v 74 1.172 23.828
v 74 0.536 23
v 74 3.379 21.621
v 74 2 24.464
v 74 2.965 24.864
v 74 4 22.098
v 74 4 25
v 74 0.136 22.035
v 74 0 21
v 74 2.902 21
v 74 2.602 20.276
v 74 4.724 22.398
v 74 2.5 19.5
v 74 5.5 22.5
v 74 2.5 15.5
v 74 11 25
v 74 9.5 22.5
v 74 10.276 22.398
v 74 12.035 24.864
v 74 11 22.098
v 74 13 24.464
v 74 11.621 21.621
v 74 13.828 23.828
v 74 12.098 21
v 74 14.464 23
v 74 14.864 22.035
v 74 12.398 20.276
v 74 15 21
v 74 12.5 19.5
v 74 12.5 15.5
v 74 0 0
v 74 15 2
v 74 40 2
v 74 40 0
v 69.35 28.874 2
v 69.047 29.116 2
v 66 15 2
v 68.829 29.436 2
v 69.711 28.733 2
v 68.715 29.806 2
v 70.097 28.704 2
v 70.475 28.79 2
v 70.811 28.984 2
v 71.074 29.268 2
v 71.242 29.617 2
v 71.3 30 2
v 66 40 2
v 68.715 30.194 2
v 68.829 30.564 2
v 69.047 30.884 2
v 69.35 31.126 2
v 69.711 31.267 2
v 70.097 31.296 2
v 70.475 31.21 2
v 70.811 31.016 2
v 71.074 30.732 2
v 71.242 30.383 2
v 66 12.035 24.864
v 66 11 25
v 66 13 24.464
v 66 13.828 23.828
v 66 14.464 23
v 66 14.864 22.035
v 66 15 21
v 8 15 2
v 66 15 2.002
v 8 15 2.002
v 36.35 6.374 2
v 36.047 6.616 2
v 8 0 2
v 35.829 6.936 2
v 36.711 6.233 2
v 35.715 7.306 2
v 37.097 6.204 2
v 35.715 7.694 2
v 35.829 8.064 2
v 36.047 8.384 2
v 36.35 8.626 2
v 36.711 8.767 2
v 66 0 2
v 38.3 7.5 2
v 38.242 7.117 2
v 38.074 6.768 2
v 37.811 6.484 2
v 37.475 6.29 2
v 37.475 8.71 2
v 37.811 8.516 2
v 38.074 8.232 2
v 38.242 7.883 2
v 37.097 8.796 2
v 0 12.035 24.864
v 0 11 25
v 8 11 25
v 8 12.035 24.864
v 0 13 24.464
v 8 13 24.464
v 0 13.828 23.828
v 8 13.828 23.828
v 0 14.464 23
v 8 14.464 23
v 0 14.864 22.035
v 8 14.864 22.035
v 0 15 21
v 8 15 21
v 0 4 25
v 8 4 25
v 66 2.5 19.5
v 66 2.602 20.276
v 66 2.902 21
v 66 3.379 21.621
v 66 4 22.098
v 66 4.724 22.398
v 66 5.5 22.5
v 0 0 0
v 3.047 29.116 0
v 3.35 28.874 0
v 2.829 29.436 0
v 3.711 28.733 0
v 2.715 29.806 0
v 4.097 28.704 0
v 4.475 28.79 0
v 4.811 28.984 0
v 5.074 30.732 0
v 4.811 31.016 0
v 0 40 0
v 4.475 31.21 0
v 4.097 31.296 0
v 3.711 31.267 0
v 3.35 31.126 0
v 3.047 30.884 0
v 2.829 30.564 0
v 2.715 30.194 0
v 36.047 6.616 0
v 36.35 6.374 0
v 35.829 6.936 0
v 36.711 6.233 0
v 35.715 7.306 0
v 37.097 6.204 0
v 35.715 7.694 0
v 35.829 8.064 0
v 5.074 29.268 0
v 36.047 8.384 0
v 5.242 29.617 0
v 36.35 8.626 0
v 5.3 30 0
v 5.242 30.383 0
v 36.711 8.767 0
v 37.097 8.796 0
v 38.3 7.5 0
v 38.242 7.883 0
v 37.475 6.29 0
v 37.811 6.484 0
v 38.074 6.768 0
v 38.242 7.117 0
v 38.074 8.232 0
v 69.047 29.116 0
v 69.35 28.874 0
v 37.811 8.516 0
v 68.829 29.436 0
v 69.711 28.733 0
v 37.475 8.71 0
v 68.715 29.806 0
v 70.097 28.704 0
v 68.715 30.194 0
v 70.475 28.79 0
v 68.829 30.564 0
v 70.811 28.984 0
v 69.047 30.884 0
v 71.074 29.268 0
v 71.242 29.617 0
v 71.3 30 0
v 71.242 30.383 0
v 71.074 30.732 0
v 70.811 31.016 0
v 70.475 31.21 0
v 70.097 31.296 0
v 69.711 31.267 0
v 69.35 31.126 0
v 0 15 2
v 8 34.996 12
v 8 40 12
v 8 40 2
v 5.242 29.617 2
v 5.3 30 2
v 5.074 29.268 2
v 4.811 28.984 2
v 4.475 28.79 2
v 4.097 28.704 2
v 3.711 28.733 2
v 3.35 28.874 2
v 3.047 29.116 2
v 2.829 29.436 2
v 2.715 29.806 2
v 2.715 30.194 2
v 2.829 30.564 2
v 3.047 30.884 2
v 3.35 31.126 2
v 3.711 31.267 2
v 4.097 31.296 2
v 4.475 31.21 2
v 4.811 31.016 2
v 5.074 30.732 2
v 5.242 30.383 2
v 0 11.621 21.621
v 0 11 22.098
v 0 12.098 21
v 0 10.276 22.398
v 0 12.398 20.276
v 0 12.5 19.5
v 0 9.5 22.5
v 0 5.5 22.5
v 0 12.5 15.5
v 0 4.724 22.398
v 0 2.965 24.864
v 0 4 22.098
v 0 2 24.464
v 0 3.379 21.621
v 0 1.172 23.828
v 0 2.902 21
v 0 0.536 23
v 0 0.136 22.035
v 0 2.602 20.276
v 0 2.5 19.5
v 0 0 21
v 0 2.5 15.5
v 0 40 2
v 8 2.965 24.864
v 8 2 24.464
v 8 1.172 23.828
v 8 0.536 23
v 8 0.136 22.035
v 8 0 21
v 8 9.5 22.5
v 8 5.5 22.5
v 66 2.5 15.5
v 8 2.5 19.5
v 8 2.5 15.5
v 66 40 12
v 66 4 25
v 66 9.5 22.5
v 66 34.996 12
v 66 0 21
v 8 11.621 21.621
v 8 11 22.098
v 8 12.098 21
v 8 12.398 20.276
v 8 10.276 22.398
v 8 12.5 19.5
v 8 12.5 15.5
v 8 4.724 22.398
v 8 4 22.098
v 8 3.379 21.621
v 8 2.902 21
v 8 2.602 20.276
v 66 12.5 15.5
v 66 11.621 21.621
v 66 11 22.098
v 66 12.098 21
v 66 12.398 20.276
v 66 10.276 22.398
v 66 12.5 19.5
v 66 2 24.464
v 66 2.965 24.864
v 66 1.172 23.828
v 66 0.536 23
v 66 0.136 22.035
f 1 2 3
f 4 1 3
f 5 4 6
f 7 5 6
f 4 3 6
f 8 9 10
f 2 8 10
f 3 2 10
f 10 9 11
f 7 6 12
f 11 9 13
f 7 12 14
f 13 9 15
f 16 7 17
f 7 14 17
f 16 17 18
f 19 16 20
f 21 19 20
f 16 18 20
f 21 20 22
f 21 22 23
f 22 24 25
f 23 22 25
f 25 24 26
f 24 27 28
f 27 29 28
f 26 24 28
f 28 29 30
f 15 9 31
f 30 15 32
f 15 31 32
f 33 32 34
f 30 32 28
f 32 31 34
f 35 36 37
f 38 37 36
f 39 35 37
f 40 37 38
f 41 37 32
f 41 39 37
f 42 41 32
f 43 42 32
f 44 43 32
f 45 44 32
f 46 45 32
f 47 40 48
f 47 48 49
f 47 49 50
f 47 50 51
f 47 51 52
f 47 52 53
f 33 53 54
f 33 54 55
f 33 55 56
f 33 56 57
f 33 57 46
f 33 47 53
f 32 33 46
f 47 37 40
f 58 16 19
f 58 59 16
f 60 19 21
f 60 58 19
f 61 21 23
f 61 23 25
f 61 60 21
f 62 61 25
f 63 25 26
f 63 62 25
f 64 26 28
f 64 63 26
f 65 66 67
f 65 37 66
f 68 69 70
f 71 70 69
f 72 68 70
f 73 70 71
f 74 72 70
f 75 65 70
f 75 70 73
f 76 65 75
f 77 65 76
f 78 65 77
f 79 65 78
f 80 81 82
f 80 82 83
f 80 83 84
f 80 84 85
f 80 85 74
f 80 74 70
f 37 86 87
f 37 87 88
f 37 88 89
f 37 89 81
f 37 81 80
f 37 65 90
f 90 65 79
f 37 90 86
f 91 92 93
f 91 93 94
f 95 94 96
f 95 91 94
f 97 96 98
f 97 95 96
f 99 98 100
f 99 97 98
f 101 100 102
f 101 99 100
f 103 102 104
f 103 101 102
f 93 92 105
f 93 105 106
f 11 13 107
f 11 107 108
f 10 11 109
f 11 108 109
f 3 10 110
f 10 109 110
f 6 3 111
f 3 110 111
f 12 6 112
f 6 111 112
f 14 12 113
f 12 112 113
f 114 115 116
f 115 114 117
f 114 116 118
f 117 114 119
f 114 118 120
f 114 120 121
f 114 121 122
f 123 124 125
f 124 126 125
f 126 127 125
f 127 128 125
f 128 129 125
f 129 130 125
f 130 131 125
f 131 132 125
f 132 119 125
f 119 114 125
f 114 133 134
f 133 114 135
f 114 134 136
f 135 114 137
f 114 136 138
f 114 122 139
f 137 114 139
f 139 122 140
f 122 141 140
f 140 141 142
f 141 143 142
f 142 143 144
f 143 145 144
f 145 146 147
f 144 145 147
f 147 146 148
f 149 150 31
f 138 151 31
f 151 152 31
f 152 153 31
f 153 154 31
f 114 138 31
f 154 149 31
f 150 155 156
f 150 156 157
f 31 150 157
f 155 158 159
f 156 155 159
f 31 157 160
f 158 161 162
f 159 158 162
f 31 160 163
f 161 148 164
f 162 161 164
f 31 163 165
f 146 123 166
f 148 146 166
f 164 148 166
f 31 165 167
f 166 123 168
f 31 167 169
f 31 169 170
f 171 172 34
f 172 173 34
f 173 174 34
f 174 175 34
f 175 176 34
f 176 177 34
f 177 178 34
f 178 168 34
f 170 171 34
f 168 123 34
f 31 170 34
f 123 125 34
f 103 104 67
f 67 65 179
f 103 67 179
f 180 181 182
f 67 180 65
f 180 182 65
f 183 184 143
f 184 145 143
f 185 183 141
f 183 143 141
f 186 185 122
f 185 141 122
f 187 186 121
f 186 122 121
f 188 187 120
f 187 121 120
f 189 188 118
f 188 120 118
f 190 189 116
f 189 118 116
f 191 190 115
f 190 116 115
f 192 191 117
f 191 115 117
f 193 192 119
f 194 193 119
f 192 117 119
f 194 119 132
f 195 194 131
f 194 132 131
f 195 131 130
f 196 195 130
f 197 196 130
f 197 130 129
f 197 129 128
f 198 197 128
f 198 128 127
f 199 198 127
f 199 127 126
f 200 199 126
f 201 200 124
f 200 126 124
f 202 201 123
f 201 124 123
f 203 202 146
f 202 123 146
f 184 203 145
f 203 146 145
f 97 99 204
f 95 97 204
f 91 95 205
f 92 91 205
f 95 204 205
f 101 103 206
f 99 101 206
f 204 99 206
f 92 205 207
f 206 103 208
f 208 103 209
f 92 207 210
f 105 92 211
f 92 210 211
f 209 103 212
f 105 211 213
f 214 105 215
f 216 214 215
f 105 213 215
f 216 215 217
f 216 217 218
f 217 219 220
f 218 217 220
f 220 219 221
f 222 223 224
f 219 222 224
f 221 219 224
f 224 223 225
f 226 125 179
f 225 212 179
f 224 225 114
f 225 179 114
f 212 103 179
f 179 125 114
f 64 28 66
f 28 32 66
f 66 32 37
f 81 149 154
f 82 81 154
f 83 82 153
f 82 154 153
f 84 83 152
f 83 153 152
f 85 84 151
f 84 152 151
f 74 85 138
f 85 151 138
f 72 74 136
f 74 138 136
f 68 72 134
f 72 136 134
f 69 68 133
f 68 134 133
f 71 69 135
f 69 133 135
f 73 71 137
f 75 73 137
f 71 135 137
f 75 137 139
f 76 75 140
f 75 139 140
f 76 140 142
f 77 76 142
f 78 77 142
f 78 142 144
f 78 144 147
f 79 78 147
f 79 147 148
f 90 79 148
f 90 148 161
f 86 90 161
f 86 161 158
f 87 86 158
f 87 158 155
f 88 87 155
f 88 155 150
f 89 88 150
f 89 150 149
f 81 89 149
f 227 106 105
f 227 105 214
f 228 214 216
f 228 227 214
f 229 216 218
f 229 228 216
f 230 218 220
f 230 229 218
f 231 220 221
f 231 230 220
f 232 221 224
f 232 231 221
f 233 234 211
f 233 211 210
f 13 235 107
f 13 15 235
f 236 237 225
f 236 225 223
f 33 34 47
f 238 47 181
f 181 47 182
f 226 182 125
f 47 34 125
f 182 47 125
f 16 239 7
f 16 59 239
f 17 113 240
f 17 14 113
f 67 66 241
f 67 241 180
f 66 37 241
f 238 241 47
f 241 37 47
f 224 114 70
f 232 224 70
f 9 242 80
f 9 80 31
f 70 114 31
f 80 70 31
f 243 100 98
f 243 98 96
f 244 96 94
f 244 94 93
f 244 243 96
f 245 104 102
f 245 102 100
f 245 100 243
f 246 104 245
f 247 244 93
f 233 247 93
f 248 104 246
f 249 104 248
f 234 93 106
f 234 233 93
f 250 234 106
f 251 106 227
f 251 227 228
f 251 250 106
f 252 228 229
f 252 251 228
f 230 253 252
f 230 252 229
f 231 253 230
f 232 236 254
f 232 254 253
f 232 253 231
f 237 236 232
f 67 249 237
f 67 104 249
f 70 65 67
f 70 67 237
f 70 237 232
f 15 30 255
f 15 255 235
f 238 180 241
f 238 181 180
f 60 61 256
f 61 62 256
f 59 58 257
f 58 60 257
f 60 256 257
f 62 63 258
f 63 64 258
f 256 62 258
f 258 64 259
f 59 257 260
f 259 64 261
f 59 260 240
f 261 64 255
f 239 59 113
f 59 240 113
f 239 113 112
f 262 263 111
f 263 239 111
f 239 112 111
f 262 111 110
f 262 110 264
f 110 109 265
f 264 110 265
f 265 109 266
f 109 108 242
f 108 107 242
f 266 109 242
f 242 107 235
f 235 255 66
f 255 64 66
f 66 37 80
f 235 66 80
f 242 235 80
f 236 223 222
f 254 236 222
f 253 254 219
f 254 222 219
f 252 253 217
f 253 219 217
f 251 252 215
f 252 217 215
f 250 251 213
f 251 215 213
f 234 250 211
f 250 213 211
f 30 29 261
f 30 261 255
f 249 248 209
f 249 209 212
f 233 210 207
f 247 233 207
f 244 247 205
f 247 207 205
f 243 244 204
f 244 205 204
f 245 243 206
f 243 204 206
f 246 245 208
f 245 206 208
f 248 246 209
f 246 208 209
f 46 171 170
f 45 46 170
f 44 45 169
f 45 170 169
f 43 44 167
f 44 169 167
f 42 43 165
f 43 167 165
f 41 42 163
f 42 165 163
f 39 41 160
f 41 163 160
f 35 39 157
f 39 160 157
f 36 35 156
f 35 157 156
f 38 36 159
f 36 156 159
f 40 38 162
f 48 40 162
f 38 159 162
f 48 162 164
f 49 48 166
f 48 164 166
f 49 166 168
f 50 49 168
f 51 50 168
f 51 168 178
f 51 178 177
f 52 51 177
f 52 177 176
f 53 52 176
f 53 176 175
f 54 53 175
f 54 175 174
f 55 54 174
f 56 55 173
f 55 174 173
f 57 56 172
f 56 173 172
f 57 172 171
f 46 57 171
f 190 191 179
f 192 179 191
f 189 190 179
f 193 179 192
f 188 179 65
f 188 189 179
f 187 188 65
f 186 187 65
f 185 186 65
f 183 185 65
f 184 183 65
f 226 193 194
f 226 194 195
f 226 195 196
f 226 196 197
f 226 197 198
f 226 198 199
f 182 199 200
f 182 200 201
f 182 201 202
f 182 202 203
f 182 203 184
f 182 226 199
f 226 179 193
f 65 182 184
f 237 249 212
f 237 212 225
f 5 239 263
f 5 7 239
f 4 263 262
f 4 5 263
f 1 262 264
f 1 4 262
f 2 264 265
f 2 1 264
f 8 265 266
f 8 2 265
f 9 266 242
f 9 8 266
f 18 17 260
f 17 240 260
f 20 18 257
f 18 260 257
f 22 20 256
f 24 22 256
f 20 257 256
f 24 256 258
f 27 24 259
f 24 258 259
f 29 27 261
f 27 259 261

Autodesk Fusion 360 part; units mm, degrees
sketch "Sketch1" plane through (0, 0, 0) normal (0, 0, 1) x (1, 0, 0)
  line L0 (0, 0) -> (74, 0)
  line L1 (74, 0) -> (74, 40)
  line L2 (74, 40) -> (0, 40)
  line L3 (0, 40) -> (0, 0)
  line L4 (0, 0) -> (74, 0)
  line L5 (74, 0) -> (74, 15)
  line L6 (74, 15) -> (0, 15)
  line L7 (0, 15) -> (0, 0)
  line L8 (0, 15) -> (8, 15)
  line L9 (8, 15) -> (8, 0)
  line L10 (8, 0) -> (0, 0)
  line L11 (0, 0) -> (0, 15)
  line L12 (74, 15) -> (66, 15)
  line L13 (66, 15) -> (66, 0)
  line L14 (66, 0) -> (74, 0)
  line L15 (74, 0) -> (74, 15)
  line L16 (8, 15) -> (66, 15)
  line L17 (66, 15) -> (66, 40)
  line L18 (66, 40) -> (8, 40)
  line L19 (8, 40) -> (8, 15)
  circle A0 centre (4, 30) radius 1.3
  circle A1 centre (70, 30) radius 1.3
  circle A2 centre (37, 7.5) radius 1.3
  dimension "d1" = 74
  dimension "d2" = 40
  dimension "d3" = 15
  dimension "d6" = 8
  dimension "d7" = 8
  dimension "d16" = 2.6
  dimension "d17" = 4
  dimension "d18" = 2.6
  dimension "d19" = 4
  dimension "d20" = 10
  dimension "d21" = 10
  dimension "d22" = 2.6
  dimension "d23" = 7.5
  dimension "d24" = 37
  dimension "d35" = 8
extrude "Extrude1" add sketch "Sketch1" along normal blind 2 contours L0 L3 L4 L6 L7 L8 L9 L10 L11 | L0 L4 L6 L9 L13 L16 | L2 L3 L6 L8 L19 | L0 L1 L4 L5 L6 L12 L13 L14 L15 | L2 L6 L16 L17 L18 L19 | L1 L2 L6 L12 L17 | A0 | A1 | A2
extrude "Extrude5" add sketch "Sketch1" along normal blind 12 contours L2 L6 L16 L17 L18 L19
chamfer "Chamfer1" distance 20 distance2 10 1 edges at (37, 15, 12) measured on face at (27.3333, 31.6667, 12)
extrude "Extrude2" add sketch "Sketch1" along normal blind 25 contours L0 L3 L4 L6 L7 L8 L9 L10 L11 | L0 L1 L4 L5 L6 L12 L13 L14 L15
sketch "Sketch2" plane through (74, 0, 0) normal (1, 0, 0) x (0, 1, 0)
  line L0 (0, 0) -> (40, 0)
  line L1 (40, 0) -> (40, 2)
  line L2 (40, 2) -> (15, 2)
  line L3 (15, 2) -> (15, 25)
  line L4 (15, 25) -> (0, 25)
  line L5 (0, 25) -> (0, 0)
  line L6 (2.5, 22.5) -> (12.5, 22.5)
  line L7 (12.5, 22.5) -> (12.5, 15.5)
  line L8 (12.5, 15.5) -> (2.5, 15.5)
  line L9 (2.5, 15.5) -> (2.5, 22.5)
  dimension "d10" = 2.5
  dimension "d11" = 2.5
  dimension "d12" = 2.5
  dimension "d13" = 7
extrude "Extrude3" cut sketch "Sketch2" against normal blind 100 contours L6 L7 L8 L9
extrude "Extrude4" cut sketch "Sketch1" along normal blind 10 contours A0 | A1 | A2
fillet "Fillet1" radius 3 4 edges at (70, 12.5, 22.5) (4, 12.5, 22.5) (70, 2.5, 22.5) (4, 2.5, 22.5)
fillet "Fillet2" radius 4 4 edges at (4, 15, 25) (4, 0, 25) (70, 0, 25) (70, 15, 25)
